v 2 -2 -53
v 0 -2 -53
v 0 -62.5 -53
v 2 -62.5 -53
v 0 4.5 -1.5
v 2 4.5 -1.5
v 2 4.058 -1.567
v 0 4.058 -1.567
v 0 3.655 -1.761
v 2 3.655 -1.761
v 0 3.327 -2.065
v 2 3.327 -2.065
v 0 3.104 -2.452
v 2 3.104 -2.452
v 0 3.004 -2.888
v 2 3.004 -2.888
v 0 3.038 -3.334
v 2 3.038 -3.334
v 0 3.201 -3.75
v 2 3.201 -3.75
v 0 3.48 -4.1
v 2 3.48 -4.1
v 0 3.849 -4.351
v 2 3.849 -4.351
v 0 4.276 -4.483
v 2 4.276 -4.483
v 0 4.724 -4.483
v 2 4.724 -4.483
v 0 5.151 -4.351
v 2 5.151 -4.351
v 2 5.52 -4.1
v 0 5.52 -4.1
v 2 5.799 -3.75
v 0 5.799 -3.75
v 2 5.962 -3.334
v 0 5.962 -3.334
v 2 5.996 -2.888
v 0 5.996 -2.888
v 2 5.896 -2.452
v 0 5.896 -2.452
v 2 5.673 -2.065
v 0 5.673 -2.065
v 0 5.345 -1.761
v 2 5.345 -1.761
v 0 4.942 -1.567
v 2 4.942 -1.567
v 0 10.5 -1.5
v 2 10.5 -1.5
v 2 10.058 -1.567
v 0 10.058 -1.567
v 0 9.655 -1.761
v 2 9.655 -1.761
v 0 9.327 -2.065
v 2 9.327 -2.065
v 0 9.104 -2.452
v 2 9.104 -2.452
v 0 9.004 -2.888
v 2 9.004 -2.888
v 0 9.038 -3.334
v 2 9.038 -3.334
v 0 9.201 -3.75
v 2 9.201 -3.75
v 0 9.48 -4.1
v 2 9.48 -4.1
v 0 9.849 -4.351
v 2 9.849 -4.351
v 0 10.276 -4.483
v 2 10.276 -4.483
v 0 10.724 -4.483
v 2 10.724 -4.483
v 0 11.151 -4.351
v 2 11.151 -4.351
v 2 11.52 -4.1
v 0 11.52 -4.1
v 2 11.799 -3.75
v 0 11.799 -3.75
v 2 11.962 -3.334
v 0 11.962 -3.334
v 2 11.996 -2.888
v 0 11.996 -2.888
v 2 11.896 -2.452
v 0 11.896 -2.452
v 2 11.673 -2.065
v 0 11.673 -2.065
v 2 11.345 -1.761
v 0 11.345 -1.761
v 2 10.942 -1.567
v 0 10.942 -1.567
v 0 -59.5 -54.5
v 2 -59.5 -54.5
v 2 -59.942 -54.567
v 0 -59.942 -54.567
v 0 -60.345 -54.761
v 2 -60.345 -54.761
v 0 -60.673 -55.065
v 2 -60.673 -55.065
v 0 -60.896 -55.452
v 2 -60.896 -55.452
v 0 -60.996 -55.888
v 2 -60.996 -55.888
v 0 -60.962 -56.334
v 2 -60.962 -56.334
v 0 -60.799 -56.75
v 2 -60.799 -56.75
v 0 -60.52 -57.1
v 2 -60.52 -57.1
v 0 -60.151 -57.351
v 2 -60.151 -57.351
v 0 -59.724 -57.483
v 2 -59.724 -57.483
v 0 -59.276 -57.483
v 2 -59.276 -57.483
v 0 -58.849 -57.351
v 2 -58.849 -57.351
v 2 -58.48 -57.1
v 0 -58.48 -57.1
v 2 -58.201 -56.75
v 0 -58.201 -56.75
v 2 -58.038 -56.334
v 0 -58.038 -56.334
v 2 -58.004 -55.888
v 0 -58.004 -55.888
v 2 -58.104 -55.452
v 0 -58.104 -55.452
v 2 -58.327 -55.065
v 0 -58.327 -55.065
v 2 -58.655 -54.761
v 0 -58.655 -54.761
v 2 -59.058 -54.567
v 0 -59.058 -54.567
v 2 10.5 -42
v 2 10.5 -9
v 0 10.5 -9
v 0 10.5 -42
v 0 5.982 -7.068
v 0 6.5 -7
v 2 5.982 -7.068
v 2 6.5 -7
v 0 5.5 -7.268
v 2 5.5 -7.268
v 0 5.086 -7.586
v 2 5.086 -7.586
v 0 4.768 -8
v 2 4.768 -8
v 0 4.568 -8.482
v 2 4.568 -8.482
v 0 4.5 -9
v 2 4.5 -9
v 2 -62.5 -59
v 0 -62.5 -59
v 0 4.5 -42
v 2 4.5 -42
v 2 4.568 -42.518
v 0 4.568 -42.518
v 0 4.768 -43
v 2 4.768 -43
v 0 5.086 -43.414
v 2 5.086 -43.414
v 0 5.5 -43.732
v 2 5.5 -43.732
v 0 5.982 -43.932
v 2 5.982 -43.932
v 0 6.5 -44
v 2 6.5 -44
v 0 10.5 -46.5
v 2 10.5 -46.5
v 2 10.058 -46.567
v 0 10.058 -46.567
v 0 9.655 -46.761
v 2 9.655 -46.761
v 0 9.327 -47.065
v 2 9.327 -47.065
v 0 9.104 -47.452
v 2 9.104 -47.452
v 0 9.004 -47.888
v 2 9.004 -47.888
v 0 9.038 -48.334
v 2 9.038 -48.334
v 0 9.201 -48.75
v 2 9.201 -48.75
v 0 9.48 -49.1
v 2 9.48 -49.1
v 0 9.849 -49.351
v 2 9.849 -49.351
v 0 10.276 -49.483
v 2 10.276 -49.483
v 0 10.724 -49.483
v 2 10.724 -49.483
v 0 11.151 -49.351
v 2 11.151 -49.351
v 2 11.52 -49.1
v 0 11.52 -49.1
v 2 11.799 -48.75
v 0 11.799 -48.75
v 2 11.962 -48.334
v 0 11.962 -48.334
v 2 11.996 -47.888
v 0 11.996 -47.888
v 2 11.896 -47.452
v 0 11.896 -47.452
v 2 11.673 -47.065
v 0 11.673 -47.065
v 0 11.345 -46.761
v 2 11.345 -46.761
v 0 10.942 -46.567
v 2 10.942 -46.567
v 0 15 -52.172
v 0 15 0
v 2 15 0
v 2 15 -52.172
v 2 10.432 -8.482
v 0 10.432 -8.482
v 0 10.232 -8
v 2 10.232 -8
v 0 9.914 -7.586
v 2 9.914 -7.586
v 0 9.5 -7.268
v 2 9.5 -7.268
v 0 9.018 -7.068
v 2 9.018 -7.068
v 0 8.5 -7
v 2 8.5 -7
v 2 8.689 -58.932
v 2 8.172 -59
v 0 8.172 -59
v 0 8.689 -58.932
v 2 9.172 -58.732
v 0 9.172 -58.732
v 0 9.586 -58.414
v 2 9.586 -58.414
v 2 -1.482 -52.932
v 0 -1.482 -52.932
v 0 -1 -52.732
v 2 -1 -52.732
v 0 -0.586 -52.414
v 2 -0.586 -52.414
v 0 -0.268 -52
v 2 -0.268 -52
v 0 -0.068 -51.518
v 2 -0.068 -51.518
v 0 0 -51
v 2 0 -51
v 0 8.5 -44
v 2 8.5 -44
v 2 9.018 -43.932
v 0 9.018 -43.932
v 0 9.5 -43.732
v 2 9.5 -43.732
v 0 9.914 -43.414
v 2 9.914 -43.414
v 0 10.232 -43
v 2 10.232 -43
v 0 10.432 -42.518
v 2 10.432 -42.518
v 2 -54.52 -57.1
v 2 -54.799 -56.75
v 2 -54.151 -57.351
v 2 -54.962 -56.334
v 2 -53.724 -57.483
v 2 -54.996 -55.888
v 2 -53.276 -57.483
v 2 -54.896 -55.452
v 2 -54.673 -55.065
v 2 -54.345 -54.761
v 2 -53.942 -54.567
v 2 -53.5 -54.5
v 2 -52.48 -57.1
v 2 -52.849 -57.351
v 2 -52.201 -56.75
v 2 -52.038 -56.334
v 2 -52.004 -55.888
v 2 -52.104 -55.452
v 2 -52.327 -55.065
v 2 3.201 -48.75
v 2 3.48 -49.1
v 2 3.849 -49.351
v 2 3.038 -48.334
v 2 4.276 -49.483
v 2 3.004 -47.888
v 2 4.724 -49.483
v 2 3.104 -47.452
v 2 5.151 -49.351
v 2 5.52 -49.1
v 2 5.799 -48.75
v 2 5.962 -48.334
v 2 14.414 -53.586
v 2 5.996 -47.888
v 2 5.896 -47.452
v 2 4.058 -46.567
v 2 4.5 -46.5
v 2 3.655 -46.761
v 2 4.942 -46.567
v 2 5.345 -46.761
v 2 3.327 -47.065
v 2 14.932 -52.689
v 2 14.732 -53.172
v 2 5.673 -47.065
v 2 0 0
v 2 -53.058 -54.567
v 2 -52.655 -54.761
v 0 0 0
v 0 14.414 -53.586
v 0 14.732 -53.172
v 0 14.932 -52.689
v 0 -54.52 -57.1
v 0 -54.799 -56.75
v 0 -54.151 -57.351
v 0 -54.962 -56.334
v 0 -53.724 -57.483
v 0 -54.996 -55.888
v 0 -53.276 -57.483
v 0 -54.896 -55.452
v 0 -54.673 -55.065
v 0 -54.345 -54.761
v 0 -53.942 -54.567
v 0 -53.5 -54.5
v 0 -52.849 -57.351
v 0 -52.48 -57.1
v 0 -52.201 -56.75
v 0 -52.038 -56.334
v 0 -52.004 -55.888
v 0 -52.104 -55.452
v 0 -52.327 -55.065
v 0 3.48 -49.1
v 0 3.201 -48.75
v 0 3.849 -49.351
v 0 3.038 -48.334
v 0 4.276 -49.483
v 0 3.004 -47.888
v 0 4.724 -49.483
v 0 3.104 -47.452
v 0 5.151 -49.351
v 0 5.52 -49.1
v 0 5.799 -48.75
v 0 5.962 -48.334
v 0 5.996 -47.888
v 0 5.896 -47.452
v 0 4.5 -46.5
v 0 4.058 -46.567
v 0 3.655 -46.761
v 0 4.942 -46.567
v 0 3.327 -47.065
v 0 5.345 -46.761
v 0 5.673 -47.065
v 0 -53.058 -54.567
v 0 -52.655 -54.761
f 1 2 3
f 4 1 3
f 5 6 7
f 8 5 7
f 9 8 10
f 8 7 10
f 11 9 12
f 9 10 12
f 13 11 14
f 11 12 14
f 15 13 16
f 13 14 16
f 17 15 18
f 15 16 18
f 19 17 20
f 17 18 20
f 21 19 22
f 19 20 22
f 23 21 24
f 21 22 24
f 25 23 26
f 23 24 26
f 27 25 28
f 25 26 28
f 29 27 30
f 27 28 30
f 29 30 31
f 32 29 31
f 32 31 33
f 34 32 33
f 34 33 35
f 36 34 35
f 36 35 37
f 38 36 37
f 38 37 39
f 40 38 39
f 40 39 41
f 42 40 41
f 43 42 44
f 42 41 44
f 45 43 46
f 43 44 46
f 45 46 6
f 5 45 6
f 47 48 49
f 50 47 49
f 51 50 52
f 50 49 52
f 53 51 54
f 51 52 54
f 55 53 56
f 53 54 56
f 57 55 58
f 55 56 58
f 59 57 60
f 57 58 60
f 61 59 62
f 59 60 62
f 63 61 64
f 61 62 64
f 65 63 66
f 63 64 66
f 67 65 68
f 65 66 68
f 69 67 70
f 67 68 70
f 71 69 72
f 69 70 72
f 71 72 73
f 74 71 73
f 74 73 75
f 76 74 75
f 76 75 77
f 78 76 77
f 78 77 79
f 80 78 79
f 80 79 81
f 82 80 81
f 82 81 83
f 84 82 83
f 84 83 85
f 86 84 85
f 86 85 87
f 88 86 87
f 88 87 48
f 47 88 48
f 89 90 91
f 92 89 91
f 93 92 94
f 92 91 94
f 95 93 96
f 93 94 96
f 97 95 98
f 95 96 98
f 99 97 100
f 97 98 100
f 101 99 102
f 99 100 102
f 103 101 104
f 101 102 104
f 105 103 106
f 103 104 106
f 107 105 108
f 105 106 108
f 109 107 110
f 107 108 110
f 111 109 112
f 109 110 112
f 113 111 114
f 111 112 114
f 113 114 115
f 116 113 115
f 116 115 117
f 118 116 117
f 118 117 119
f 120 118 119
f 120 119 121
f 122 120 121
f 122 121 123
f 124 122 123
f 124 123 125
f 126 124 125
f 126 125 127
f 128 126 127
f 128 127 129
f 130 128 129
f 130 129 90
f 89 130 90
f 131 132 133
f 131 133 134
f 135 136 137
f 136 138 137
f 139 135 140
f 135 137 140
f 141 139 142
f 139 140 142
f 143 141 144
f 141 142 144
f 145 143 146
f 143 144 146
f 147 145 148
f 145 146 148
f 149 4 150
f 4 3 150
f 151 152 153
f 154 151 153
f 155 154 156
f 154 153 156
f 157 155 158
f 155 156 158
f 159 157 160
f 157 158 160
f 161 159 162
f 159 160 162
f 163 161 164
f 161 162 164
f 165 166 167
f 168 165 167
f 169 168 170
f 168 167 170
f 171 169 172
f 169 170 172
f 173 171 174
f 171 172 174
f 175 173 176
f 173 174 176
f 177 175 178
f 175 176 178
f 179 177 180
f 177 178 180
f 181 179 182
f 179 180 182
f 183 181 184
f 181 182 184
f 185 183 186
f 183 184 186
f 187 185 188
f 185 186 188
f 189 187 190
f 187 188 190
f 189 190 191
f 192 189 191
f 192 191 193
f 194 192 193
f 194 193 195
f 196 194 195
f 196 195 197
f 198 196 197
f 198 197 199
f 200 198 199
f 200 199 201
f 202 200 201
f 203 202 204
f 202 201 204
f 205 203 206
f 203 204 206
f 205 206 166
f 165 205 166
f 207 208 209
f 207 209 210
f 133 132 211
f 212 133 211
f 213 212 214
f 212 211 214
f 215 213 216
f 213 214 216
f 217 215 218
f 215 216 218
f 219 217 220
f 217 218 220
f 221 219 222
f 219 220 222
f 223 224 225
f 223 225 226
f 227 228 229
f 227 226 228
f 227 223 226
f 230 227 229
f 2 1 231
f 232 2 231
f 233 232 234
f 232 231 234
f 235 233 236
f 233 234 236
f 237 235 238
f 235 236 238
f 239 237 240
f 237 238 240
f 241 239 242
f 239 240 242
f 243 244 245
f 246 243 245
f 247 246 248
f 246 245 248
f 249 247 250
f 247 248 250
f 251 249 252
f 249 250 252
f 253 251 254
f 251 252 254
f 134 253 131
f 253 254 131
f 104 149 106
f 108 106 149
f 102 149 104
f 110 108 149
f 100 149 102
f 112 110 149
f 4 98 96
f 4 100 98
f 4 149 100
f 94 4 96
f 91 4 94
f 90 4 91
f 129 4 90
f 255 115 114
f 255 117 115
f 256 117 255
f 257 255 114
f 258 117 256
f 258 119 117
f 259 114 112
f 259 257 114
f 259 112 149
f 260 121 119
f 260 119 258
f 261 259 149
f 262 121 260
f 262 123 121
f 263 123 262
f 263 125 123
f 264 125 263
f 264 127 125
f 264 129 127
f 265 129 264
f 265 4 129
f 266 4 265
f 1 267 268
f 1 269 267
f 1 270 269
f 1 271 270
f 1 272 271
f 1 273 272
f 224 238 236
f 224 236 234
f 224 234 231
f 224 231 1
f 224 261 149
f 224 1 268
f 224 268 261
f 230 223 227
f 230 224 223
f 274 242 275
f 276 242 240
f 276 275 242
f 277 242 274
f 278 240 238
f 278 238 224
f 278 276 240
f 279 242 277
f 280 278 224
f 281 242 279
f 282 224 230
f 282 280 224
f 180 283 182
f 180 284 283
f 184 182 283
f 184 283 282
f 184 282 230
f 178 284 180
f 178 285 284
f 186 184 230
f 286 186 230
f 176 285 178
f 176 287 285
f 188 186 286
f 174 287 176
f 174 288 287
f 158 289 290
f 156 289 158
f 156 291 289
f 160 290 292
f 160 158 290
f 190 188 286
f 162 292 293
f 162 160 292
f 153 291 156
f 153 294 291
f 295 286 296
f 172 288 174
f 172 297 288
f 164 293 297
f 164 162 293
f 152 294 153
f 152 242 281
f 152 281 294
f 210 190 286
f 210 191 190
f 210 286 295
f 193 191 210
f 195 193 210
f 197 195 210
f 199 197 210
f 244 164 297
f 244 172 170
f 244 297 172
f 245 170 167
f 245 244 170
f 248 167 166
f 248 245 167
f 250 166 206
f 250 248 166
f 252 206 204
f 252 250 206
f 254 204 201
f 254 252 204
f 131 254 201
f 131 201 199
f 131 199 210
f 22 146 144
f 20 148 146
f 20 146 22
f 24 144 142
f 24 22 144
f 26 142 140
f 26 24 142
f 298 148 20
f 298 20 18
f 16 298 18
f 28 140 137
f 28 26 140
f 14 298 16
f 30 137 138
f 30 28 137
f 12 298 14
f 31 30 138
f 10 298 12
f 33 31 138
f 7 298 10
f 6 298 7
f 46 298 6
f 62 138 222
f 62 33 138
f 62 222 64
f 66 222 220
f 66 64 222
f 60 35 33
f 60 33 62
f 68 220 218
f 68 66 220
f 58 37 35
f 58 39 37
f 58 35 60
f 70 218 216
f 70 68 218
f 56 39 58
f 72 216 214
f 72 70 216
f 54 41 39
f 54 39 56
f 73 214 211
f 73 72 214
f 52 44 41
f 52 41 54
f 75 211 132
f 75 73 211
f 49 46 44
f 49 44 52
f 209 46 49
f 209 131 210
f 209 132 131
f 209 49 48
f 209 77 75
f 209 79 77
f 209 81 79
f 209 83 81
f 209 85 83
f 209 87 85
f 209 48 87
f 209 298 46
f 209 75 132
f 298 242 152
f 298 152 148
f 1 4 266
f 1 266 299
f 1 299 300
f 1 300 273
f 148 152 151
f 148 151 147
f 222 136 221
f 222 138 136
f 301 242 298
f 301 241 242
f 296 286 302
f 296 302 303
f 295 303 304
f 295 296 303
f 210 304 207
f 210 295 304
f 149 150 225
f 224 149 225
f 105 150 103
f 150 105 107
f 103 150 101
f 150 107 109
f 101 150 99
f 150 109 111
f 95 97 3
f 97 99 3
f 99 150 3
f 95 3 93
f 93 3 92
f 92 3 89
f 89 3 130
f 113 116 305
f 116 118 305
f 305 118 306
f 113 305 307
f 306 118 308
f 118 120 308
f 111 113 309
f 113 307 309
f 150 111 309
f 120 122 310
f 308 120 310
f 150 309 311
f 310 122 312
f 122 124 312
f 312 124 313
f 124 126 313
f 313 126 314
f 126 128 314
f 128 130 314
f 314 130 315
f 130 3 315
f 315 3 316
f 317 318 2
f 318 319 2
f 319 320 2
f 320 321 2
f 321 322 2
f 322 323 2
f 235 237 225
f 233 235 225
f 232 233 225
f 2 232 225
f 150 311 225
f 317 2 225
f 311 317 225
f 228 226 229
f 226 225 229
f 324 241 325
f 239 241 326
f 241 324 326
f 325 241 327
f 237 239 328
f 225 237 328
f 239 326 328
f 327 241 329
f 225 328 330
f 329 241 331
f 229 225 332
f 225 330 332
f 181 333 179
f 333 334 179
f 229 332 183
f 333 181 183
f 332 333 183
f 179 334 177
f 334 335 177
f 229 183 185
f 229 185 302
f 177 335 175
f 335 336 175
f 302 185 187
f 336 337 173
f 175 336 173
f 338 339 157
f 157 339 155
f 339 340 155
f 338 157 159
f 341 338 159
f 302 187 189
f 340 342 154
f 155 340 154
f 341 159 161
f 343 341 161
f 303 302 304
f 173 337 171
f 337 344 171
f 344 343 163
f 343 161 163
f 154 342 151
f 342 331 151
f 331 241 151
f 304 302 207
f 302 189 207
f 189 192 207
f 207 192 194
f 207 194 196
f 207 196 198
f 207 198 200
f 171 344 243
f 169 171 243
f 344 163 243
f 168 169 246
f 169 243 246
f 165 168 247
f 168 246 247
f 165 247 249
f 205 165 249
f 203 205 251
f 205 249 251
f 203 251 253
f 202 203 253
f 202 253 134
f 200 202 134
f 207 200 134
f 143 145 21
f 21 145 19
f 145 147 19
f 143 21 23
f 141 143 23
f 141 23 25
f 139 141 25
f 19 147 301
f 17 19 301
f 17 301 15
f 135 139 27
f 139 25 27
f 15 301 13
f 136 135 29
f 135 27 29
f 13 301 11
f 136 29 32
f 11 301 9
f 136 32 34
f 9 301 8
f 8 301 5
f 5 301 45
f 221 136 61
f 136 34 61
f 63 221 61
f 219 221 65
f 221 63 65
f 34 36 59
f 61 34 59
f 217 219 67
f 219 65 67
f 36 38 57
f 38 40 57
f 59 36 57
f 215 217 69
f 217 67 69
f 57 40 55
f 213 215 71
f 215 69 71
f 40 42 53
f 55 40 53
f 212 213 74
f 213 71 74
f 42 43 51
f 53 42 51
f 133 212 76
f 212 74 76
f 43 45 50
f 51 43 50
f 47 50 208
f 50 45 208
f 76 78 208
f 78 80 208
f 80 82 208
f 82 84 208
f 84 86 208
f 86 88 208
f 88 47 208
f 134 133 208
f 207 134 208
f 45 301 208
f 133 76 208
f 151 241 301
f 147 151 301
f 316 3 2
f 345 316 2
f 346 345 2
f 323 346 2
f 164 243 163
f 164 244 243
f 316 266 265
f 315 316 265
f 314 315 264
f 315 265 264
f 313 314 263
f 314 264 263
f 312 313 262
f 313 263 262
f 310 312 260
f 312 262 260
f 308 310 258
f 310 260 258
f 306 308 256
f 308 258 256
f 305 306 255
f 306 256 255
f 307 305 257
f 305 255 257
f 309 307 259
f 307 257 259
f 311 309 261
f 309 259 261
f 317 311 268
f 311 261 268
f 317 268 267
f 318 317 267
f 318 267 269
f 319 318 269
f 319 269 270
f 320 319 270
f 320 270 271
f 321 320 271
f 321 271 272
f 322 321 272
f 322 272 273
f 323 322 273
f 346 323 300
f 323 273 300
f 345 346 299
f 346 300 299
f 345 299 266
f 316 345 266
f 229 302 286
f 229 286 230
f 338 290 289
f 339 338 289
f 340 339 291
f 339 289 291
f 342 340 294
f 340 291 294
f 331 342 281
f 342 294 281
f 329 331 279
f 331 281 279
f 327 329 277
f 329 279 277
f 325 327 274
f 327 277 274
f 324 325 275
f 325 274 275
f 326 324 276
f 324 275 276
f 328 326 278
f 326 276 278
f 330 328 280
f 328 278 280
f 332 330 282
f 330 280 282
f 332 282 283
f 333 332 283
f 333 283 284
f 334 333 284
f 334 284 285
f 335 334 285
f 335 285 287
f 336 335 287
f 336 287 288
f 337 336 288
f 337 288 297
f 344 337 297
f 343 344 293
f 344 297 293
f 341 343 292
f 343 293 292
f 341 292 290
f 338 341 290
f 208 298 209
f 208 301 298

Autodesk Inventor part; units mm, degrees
ref_plane "YZ Plane" through (0, 0, 0) normal (1, 0, 0) x (0, 1, 0)
ref_plane "XZ Plane" through (0, 0, 0) normal (0, 1, 0) x (-1, 0, 0)
ref_plane "XY Plane" through (0, 0, 0) normal (0, 0, 1) x (1, 0, 0)
sketch "スケッチ1" plane through (0, 0, 0) normal (1, 0, 0) x (0, 1, 0)
  line L0 (0, 0) -> (15, 0)
  line L1 (15, 0) -> (15, -53)
  line L2 (15, -53) -> (0, -53)
  line L3 (0, -53) -> (0, 0)
  line L4 (9, -53) -> (-62.5, -53)
  line L5 (-62.5, -53) -> (-62.5, -59)
  line L6 (-62.5, -59) -> (9, -59)
  line L7 (9, -59) -> (9, -53)
  line L8 (15, -53) -> (9, -59)
  line L9 (0, -53) -> (0, -53)
  line L10 (10.5, -3) -> (4.5, -3)
  line L11 (4.5, -3) -> (4.5, -48)
  line L12 (4.5, -48) -> (10.5, -48)
  line L13 (10.5, -48) -> (10.5, -3)
  line L14 (15, -50.5) -> (0, -50.5)
  point P0 (7.5, 0)
  point P1 (7.5, -3)
  point P2 (-53.5, -56)
  point P3 (-59.5, -56)
  point P4 (-62.5, -56)
  dimension "d0" = 53
  dimension "d4" = 6
  dimension "d5" = 3
  dimension "d6" = 5
  dimension "d22" = 4.5
  dimension "d23" = 6
  dimension "d24" = 6
  dimension "d25" = 3
  dimension "d26" = 73
  dimension "d27" = 2.5
  dimension "d28" = 2.5
  dimension "d29" = 135
extrude "押し出し1" add sketch "スケッチ1" along normal blind 2 contours L0 L1 L14 L3 | L14 L1 L2 L3 | L2 L7 L6 L5 L4 | L8 L7 L2 | L13 L12 L11 L10
hole "穴1" at (0, 10.5, -3) at (0, 4.5, -3) at (0, 10.5, -48) at (0, 4.5, -48) at (0, -53.5, -56) at (0, -59.5, -56) direction (1, 0, 0) diameter 3 depth 8.8
sketch "スケッチ2" plane through (2, 0, 0) normal (1, 0, 0) x (0, 0, -1)
  line L0 (9, 10.5) -> (42, 10.5)
  line L1 (44, 8.5) -> (44, 6.5)
  line L2 (42, 4.5) -> (9, 4.5)
  line L3 (7, 6.5) -> (7, 8.5)
  line L4 (0, 15) -> (0, 0) projected
  circle A0 centre (3, 10.5) radius 1.5 projected
  circle A1 centre (48, 10.5) radius 1.5 projected
  arc A2 (9, 10.5) -> (7, 8.5) centre (9, 8.5) ccw
  arc A3 (7, 6.5) -> (9, 4.5) centre (9, 6.5) ccw
  arc A4 (42, 4.5) -> (44, 6.5) centre (42, 6.5) ccw
  arc A5 (44, 8.5) -> (42, 10.5) centre (42, 8.5) ccw
  point P0 (44, 10.5)
  point P1 (7, 7.5)
  point P2 (0, 7.5)
  dimension "d16" = 4
  dimension "d17" = 4
  dimension "d18" = 2
extrude "押し出し2" cut sketch "スケッチ2" against normal blind 2 contours L0 A5 L1 A4 L2 A3 L3 A2
fillet "フィレット1" radius 2 1 edges at (1, 15, -53)
fillet "フィレット2" radius 2 2 edges at (1, 9, -59) (1, 0, -53)
equation "\"d1\" = 1"
properties part number "Plate_Support" material "アルミニウム 6061"
